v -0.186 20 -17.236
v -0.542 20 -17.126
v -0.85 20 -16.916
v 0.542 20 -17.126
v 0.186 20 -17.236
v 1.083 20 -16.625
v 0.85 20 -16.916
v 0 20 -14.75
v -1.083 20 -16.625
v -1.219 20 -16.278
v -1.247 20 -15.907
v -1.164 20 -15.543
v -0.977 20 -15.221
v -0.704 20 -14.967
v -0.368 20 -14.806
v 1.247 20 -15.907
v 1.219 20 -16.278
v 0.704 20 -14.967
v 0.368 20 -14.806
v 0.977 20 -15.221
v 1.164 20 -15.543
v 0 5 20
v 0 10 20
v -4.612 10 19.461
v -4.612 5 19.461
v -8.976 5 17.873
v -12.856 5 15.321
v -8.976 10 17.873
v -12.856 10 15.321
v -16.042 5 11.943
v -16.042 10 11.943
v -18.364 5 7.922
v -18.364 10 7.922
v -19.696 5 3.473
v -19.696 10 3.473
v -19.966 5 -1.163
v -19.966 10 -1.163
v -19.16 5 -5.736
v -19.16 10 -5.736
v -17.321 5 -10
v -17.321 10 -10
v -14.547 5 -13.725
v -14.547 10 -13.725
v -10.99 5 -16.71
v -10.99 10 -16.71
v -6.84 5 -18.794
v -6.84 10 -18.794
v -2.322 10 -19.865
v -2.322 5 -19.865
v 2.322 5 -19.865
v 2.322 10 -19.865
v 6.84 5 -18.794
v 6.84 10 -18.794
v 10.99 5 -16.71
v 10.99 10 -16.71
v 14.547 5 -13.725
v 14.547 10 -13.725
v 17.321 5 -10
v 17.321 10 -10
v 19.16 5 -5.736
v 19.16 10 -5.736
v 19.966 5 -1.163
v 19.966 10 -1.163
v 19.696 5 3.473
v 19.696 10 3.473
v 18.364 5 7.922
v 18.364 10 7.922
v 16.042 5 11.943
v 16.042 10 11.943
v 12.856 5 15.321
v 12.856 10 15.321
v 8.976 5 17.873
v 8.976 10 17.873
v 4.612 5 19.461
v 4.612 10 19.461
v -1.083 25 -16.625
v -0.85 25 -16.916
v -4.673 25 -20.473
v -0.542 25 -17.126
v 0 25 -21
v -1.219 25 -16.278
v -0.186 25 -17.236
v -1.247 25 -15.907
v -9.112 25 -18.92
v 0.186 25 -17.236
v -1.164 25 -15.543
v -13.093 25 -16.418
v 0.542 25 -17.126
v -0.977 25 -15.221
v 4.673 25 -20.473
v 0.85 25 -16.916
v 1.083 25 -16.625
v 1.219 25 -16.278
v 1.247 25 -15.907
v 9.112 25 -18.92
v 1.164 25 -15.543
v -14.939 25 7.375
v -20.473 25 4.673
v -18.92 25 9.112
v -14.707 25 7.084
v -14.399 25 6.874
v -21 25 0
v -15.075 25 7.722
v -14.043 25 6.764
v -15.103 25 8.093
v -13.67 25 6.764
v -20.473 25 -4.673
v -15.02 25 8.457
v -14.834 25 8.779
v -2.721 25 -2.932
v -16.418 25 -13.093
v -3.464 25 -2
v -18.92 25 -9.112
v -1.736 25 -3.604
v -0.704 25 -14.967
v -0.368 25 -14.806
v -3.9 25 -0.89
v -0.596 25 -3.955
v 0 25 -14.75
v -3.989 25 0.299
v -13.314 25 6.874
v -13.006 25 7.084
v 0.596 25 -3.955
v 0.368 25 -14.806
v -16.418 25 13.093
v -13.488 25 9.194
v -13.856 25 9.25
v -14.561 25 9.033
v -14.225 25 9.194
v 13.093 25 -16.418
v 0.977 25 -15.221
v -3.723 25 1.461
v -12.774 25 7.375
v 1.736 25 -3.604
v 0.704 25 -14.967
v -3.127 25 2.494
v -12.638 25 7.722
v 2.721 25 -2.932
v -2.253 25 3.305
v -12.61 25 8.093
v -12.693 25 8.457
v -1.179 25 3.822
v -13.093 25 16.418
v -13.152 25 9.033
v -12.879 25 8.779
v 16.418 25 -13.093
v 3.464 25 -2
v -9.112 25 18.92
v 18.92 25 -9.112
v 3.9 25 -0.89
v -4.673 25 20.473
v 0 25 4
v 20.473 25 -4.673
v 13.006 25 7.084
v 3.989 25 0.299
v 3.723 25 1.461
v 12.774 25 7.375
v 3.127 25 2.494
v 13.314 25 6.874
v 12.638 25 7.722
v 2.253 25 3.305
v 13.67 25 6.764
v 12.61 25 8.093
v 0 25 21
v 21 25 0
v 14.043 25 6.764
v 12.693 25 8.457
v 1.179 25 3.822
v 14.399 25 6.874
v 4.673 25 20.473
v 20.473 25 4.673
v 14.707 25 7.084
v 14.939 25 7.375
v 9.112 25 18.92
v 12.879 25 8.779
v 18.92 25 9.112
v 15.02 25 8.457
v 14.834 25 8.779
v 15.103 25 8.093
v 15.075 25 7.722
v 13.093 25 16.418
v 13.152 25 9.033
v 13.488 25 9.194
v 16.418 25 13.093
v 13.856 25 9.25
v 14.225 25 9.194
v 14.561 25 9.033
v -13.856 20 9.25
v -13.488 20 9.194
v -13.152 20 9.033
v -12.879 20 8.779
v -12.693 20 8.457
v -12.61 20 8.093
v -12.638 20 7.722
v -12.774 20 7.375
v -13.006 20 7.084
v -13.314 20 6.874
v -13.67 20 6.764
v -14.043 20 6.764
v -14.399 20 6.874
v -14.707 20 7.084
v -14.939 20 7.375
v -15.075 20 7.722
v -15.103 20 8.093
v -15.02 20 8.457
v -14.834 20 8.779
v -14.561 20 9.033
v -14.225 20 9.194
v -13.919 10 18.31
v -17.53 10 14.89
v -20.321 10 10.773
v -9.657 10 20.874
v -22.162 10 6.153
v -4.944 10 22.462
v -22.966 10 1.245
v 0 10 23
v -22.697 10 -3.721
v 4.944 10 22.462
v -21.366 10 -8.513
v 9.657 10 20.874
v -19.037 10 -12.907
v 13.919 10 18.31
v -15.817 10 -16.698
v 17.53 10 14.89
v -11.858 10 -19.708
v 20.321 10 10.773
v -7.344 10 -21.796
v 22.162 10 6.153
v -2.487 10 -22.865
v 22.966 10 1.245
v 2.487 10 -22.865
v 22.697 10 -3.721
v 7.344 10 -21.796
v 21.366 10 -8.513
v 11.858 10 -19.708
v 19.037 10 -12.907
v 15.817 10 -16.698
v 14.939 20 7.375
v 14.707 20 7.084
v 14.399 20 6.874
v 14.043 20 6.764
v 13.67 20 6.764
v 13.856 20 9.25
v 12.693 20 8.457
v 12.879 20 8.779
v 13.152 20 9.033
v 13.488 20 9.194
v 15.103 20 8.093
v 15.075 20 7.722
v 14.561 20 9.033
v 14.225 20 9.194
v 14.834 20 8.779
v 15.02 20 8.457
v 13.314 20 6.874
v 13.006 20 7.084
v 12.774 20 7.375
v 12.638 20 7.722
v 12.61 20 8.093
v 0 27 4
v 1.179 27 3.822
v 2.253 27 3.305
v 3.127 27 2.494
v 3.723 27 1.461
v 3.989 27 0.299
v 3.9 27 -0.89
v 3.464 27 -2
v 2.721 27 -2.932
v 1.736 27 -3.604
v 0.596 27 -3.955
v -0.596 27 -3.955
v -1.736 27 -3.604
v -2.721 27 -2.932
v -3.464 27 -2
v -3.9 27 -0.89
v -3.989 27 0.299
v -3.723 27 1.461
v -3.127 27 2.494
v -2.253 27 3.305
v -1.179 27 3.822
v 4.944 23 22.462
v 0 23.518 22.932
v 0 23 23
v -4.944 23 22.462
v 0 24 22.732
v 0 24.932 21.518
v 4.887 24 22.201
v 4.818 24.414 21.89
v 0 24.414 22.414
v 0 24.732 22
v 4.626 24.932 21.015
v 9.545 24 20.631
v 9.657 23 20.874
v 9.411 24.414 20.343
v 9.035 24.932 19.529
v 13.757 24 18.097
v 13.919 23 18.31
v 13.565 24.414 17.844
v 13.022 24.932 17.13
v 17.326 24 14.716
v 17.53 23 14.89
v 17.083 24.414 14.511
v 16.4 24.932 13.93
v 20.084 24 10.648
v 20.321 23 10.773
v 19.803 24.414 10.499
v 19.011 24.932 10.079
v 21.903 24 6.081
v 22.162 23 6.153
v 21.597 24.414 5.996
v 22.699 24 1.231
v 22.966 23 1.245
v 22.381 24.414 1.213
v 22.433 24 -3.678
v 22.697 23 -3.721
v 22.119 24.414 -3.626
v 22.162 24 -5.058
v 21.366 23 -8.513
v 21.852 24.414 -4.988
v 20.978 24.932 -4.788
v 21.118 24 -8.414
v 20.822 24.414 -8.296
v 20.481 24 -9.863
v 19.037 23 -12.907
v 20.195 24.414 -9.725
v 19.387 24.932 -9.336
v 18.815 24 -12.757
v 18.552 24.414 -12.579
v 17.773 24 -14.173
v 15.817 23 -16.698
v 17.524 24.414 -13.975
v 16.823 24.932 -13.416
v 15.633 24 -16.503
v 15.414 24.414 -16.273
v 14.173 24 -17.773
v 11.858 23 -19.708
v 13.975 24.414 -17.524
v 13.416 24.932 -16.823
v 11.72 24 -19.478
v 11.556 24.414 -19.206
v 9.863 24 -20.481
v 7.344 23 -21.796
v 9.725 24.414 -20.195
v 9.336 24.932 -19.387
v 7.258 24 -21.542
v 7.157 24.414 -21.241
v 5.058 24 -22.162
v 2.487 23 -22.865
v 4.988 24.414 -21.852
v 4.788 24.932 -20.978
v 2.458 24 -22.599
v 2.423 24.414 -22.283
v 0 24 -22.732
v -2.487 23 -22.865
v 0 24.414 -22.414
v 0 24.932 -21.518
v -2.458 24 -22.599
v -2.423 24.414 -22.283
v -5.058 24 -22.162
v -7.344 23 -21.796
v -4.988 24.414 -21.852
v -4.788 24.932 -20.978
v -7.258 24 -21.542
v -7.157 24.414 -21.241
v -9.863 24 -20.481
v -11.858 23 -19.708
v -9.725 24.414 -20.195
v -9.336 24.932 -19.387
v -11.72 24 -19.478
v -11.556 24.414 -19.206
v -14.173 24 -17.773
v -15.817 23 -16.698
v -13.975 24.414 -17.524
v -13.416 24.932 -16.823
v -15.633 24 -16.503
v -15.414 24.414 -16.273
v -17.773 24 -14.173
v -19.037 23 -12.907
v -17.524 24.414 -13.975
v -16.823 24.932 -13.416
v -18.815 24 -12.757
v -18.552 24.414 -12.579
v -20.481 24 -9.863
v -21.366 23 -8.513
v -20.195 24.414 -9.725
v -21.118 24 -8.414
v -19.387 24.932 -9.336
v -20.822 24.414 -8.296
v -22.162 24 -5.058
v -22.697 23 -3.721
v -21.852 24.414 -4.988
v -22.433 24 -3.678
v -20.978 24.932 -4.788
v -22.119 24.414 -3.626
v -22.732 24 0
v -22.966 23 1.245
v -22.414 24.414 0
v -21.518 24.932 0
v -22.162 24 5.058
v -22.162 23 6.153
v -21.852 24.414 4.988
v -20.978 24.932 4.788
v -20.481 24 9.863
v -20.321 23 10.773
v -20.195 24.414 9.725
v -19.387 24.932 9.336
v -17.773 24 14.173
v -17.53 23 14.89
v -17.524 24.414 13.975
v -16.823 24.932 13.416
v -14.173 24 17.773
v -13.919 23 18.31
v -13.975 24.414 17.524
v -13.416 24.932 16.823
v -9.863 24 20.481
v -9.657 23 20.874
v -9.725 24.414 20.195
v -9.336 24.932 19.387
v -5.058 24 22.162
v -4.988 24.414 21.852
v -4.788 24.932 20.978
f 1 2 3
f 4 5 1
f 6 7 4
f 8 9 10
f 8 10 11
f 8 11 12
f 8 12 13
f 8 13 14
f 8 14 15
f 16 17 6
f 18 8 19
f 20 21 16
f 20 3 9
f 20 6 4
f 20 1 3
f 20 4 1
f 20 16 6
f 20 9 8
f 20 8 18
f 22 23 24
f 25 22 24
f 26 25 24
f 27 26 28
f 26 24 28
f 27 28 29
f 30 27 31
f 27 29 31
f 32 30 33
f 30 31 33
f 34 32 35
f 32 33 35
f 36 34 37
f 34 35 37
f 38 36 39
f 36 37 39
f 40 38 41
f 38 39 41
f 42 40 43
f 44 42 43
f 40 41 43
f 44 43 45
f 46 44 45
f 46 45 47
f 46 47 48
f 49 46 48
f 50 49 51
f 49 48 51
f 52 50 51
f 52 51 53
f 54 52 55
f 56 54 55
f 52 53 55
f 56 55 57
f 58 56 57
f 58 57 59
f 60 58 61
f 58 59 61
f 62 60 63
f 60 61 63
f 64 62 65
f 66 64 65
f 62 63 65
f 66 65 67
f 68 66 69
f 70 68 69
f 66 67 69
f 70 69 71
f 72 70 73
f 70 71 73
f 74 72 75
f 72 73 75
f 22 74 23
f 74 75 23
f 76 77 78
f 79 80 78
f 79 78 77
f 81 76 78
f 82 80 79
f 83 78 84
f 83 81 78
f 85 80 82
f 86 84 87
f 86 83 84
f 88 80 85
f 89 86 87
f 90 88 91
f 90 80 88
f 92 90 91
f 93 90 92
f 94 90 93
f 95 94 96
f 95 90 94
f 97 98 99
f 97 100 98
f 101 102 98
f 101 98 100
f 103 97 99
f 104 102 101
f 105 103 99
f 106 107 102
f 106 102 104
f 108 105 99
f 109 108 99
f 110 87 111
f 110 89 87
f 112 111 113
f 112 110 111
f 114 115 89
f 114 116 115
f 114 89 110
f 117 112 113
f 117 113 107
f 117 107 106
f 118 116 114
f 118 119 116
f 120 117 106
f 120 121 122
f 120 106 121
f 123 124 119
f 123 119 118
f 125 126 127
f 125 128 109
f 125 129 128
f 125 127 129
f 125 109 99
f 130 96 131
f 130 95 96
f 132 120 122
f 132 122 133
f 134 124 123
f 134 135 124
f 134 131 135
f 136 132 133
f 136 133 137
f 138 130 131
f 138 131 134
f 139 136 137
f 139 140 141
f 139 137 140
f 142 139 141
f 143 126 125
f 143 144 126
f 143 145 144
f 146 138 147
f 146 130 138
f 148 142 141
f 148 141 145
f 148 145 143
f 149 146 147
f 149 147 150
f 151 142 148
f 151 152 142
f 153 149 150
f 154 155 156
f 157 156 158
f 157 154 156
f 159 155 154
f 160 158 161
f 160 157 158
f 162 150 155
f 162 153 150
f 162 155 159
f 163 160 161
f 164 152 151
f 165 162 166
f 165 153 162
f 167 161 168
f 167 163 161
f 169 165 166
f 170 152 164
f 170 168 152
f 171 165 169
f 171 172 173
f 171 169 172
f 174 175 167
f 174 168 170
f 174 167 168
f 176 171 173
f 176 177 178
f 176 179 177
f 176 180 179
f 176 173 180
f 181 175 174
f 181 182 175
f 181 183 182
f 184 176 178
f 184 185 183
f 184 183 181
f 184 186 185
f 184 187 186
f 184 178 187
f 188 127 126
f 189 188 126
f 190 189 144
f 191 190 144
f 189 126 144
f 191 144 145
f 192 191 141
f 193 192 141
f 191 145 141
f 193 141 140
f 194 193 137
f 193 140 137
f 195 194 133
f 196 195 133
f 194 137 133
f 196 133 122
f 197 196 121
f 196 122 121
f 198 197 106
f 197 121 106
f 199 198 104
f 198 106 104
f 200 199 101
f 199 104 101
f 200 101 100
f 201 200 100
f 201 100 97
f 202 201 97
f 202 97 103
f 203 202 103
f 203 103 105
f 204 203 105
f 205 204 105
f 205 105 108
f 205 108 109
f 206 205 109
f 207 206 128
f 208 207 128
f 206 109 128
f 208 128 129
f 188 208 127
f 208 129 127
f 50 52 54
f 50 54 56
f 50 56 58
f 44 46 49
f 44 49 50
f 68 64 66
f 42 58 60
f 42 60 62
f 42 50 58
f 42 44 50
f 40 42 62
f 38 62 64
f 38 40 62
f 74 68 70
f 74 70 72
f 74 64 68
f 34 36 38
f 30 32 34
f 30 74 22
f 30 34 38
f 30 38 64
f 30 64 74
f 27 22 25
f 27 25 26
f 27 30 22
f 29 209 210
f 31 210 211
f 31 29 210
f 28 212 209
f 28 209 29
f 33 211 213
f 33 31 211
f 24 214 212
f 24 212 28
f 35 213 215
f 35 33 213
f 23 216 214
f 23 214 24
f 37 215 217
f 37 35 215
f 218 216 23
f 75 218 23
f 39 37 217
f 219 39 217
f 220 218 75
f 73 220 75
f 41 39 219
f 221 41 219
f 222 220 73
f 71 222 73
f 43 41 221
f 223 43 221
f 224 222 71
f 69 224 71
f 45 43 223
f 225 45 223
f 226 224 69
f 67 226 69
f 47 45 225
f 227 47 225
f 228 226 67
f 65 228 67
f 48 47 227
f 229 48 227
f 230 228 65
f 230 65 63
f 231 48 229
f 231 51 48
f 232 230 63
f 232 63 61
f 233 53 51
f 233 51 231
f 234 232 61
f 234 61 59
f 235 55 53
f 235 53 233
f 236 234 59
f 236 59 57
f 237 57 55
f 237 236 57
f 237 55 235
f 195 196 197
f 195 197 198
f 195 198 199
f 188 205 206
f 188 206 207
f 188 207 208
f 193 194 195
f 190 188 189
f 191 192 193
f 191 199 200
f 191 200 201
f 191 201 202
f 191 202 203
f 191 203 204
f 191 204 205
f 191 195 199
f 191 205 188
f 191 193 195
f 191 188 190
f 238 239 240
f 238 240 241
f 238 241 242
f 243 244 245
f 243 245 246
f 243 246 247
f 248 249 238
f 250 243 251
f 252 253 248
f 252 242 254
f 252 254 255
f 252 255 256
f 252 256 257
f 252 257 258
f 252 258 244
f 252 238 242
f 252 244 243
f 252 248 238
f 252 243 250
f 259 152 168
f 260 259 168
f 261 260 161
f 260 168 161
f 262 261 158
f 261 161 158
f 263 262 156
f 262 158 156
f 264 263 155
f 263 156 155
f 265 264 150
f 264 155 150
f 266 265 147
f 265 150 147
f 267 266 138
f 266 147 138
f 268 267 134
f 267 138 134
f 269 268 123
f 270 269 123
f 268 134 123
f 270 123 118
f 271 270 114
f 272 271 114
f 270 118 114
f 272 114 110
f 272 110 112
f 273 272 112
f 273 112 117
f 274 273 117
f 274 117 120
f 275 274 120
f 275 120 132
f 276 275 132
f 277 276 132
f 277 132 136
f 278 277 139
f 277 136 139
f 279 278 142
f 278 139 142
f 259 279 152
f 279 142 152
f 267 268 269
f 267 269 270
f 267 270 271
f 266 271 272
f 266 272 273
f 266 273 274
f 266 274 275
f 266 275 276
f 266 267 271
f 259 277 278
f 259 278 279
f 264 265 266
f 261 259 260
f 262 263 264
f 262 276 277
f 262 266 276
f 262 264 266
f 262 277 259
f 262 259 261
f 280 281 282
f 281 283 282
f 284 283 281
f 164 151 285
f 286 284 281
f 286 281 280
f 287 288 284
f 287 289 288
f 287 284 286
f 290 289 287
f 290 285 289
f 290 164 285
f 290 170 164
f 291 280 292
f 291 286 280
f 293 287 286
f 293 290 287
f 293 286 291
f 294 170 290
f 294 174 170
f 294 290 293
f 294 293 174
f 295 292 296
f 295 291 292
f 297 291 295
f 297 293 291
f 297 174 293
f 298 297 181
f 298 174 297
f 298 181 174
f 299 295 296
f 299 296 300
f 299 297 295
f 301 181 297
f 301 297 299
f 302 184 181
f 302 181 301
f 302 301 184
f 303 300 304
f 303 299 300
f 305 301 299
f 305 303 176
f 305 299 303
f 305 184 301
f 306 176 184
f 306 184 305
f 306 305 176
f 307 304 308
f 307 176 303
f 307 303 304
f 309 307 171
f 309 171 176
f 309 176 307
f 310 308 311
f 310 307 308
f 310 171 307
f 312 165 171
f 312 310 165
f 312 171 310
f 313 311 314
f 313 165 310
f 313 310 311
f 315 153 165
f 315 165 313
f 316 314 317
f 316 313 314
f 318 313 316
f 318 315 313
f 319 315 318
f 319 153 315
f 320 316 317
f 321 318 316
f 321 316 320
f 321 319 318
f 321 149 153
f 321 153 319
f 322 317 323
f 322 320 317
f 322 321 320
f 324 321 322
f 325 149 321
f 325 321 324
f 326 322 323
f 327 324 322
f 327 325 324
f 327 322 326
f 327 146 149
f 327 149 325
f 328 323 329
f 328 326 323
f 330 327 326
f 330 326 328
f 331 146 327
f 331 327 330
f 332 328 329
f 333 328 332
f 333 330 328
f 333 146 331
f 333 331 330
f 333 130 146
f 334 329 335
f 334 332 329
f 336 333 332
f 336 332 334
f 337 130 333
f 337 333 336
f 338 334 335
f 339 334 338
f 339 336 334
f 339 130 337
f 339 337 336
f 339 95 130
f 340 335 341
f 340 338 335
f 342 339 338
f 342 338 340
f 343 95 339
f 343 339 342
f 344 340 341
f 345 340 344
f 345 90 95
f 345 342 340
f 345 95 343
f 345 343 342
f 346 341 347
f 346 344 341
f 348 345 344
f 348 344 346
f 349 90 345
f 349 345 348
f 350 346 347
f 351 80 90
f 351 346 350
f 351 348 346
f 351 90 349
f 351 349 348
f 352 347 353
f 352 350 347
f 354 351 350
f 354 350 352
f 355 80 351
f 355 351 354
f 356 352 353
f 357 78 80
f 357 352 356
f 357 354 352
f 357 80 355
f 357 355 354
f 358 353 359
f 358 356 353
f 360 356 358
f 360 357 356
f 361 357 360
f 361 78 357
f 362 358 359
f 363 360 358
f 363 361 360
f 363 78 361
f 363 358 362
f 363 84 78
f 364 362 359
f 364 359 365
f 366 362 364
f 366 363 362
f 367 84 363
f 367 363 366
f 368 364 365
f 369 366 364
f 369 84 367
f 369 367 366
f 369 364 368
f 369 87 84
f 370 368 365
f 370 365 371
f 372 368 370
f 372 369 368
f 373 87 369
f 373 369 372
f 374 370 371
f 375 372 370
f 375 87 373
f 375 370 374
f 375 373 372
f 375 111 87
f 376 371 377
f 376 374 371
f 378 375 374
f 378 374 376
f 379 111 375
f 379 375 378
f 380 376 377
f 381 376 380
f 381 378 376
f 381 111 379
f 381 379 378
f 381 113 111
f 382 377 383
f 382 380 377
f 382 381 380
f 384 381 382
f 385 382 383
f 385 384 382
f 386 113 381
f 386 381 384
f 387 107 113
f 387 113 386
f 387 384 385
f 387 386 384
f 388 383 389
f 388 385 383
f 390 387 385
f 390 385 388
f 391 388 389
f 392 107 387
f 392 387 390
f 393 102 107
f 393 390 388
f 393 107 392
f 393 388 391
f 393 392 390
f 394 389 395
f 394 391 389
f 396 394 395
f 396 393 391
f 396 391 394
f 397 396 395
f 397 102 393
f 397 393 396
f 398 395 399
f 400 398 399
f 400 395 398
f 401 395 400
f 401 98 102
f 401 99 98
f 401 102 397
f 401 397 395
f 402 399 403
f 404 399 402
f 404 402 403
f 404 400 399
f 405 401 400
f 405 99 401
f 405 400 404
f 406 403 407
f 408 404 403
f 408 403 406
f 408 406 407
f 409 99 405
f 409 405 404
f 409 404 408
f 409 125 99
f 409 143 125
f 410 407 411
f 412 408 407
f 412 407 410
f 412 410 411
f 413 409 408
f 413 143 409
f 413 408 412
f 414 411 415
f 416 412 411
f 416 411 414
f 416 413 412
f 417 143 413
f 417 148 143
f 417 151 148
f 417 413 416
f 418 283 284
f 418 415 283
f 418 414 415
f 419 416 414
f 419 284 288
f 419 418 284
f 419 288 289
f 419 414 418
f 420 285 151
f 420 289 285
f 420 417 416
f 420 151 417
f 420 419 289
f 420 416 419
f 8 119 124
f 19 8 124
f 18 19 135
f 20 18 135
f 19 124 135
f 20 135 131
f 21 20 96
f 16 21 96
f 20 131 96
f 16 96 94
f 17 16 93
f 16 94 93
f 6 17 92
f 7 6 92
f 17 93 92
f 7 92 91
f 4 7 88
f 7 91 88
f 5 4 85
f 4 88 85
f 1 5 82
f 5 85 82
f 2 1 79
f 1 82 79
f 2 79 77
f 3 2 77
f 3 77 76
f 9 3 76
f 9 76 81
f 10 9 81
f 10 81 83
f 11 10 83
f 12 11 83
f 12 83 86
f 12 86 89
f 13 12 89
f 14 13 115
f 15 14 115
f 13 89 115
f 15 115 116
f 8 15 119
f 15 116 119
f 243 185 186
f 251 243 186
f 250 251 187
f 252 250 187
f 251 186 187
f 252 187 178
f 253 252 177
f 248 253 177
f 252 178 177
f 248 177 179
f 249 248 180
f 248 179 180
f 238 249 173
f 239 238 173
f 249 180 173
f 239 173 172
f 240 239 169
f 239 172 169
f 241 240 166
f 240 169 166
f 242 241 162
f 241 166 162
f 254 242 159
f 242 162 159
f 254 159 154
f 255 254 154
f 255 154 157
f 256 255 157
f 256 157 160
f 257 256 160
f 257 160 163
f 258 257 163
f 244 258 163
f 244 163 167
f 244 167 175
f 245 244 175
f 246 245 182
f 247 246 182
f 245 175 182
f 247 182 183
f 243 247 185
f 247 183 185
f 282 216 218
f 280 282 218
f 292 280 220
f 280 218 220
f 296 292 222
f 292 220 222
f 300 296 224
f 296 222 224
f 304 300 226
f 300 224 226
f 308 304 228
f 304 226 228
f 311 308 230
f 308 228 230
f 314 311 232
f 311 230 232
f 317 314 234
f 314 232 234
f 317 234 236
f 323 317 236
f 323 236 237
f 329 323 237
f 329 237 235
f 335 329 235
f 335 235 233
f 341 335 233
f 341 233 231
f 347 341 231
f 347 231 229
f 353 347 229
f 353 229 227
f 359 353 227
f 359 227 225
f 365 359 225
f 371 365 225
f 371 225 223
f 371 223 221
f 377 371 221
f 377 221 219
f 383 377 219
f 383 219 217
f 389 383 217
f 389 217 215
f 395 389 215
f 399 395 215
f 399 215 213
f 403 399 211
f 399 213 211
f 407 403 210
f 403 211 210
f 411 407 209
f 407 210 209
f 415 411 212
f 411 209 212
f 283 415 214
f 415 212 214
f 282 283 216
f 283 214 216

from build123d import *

# Parameters (mm, degrees)
SKETCH6_R           = 23
BOSS_EXTRUDE3_DEPTH = 25
SKETCH7_R           = 1.5
CUT_EXTRUDE2_DEPTH  = 5
SKETCH8_R           = 1.25
CUT_EXTRUDE3_DEPTH  = 5
SKETCH9_R           = 4
BOSS_EXTRUDE4_DEPTH = 2
SKETCH10_R          = 2
BOSS_EXTRUDE5_DEPTH = 3
FILLET1_R           = 5
FILLET2_R           = 2
SKETCH11_W          = 63.139776453
SKETCH11_H          = 24.157827512
CUT_EXTRUDE4_DEPTH  = 50
SKETCH12_R          = 20
BOSS_EXTRUDE6_DEPTH = 5


with BuildPart() as part:
    # Sketch6 → Boss-Extrude3 (new body)
    with BuildSketch(Plane(origin=(0, 0, 0), x_dir=(1, 0, 0), z_dir=(0, 1, 0))):
        with Locations(Location((0, 0, 0), (0, 0, 270))):
            Circle(SKETCH6_R)
    extrude(amount=BOSS_EXTRUDE3_DEPTH)

    # Sketch7 → Cut-Extrude2 (cut)
    with BuildSketch(Plane(origin=(0, 0, 0), x_dir=(1, 0, 0), z_dir=(0, 1, 0))):
        with Locations(Location((-6, 0, 0), (0, 0, 270))):
            Circle(SKETCH7_R)
        with Locations(Location((0, 6, 0), (0, 0, 270))):
            Circle(SKETCH7_R)
        with Locations(Location((6, 0, 0), (0, 0, 270))):
            Circle(SKETCH7_R)
        with Locations(Location((0, -6, 0), (0, 0, 270))):
            Circle(SKETCH7_R)
    extrude(amount=CUT_EXTRUDE2_DEPTH, mode=Mode.SUBTRACT)

    # Sketch8 → Cut-Extrude3 (cut)
    with BuildSketch(Plane(origin=(0, 25, 0), x_dir=(1, 0, 0), z_dir=(0, 1, 0))):
        with Locations(Location((-13.856406461, -8, 0), (0, 0, 270))):
            Circle(SKETCH8_R)
        with Locations(Location((0, 16, 0), (0, 0, 270))):
            Circle(SKETCH8_R)
        with Locations(Location((13.856406461, -8, 0), (0, 0, 270))):
            Circle(SKETCH8_R)
    extrude(amount=-CUT_EXTRUDE3_DEPTH, mode=Mode.SUBTRACT)

    # Sketch9 → Boss-Extrude4 (add)
    with BuildSketch(Plane(origin=(0, 25, 0), x_dir=(1, 0, 0), z_dir=(0, 1, 0))):
        with Locations(Location((0, 0, 0), (0, 0, 270))):
            Circle(SKETCH9_R)
    extrude(amount=BOSS_EXTRUDE4_DEPTH)

    # Sketch10 → Boss-Extrude5 (add)
    with BuildSketch(Plane.XZ):
        with Locations(Location((0, 0, 0), (0, 0, 90))):
            Circle(SKETCH10_R)
    extrude(amount=BOSS_EXTRUDE5_DEPTH)

    # Fillet1
    fillet1_edges = [part.edges().sort_by_distance(p)[0] for p in [
        (0, 0, -23),
    ]]
    fillet(fillet1_edges, radius=FILLET1_R)

    # Fillet2
    fillet2_edges = [part.edges().sort_by_distance(p)[0] for p in [
        (0, 25, -23),
    ]]
    fillet(fillet2_edges, radius=FILLET2_R)

    # Sketch11 → Cut-Extrude4 (cut, symmetric)
    with BuildSketch(Plane(origin=(0, 0, 0), x_dir=(0, 0, -1), z_dir=(1, 0, 0))):
        with Locations((5.009304592, -2.078913756)):
            Rectangle(SKETCH11_W, SKETCH11_H)
    extrude(amount=CUT_EXTRUDE4_DEPTH, both=True, mode=Mode.SUBTRACT)

    # Sketch12 → Boss-Extrude6 (add)
    with BuildSketch(Plane.XZ.offset(-10)):
        with Locations(Location((0, 0, 0), (0, 0, 90))):
            Circle(SKETCH12_R)
    extrude(amount=BOSS_EXTRUDE6_DEPTH)


solid = part.part
